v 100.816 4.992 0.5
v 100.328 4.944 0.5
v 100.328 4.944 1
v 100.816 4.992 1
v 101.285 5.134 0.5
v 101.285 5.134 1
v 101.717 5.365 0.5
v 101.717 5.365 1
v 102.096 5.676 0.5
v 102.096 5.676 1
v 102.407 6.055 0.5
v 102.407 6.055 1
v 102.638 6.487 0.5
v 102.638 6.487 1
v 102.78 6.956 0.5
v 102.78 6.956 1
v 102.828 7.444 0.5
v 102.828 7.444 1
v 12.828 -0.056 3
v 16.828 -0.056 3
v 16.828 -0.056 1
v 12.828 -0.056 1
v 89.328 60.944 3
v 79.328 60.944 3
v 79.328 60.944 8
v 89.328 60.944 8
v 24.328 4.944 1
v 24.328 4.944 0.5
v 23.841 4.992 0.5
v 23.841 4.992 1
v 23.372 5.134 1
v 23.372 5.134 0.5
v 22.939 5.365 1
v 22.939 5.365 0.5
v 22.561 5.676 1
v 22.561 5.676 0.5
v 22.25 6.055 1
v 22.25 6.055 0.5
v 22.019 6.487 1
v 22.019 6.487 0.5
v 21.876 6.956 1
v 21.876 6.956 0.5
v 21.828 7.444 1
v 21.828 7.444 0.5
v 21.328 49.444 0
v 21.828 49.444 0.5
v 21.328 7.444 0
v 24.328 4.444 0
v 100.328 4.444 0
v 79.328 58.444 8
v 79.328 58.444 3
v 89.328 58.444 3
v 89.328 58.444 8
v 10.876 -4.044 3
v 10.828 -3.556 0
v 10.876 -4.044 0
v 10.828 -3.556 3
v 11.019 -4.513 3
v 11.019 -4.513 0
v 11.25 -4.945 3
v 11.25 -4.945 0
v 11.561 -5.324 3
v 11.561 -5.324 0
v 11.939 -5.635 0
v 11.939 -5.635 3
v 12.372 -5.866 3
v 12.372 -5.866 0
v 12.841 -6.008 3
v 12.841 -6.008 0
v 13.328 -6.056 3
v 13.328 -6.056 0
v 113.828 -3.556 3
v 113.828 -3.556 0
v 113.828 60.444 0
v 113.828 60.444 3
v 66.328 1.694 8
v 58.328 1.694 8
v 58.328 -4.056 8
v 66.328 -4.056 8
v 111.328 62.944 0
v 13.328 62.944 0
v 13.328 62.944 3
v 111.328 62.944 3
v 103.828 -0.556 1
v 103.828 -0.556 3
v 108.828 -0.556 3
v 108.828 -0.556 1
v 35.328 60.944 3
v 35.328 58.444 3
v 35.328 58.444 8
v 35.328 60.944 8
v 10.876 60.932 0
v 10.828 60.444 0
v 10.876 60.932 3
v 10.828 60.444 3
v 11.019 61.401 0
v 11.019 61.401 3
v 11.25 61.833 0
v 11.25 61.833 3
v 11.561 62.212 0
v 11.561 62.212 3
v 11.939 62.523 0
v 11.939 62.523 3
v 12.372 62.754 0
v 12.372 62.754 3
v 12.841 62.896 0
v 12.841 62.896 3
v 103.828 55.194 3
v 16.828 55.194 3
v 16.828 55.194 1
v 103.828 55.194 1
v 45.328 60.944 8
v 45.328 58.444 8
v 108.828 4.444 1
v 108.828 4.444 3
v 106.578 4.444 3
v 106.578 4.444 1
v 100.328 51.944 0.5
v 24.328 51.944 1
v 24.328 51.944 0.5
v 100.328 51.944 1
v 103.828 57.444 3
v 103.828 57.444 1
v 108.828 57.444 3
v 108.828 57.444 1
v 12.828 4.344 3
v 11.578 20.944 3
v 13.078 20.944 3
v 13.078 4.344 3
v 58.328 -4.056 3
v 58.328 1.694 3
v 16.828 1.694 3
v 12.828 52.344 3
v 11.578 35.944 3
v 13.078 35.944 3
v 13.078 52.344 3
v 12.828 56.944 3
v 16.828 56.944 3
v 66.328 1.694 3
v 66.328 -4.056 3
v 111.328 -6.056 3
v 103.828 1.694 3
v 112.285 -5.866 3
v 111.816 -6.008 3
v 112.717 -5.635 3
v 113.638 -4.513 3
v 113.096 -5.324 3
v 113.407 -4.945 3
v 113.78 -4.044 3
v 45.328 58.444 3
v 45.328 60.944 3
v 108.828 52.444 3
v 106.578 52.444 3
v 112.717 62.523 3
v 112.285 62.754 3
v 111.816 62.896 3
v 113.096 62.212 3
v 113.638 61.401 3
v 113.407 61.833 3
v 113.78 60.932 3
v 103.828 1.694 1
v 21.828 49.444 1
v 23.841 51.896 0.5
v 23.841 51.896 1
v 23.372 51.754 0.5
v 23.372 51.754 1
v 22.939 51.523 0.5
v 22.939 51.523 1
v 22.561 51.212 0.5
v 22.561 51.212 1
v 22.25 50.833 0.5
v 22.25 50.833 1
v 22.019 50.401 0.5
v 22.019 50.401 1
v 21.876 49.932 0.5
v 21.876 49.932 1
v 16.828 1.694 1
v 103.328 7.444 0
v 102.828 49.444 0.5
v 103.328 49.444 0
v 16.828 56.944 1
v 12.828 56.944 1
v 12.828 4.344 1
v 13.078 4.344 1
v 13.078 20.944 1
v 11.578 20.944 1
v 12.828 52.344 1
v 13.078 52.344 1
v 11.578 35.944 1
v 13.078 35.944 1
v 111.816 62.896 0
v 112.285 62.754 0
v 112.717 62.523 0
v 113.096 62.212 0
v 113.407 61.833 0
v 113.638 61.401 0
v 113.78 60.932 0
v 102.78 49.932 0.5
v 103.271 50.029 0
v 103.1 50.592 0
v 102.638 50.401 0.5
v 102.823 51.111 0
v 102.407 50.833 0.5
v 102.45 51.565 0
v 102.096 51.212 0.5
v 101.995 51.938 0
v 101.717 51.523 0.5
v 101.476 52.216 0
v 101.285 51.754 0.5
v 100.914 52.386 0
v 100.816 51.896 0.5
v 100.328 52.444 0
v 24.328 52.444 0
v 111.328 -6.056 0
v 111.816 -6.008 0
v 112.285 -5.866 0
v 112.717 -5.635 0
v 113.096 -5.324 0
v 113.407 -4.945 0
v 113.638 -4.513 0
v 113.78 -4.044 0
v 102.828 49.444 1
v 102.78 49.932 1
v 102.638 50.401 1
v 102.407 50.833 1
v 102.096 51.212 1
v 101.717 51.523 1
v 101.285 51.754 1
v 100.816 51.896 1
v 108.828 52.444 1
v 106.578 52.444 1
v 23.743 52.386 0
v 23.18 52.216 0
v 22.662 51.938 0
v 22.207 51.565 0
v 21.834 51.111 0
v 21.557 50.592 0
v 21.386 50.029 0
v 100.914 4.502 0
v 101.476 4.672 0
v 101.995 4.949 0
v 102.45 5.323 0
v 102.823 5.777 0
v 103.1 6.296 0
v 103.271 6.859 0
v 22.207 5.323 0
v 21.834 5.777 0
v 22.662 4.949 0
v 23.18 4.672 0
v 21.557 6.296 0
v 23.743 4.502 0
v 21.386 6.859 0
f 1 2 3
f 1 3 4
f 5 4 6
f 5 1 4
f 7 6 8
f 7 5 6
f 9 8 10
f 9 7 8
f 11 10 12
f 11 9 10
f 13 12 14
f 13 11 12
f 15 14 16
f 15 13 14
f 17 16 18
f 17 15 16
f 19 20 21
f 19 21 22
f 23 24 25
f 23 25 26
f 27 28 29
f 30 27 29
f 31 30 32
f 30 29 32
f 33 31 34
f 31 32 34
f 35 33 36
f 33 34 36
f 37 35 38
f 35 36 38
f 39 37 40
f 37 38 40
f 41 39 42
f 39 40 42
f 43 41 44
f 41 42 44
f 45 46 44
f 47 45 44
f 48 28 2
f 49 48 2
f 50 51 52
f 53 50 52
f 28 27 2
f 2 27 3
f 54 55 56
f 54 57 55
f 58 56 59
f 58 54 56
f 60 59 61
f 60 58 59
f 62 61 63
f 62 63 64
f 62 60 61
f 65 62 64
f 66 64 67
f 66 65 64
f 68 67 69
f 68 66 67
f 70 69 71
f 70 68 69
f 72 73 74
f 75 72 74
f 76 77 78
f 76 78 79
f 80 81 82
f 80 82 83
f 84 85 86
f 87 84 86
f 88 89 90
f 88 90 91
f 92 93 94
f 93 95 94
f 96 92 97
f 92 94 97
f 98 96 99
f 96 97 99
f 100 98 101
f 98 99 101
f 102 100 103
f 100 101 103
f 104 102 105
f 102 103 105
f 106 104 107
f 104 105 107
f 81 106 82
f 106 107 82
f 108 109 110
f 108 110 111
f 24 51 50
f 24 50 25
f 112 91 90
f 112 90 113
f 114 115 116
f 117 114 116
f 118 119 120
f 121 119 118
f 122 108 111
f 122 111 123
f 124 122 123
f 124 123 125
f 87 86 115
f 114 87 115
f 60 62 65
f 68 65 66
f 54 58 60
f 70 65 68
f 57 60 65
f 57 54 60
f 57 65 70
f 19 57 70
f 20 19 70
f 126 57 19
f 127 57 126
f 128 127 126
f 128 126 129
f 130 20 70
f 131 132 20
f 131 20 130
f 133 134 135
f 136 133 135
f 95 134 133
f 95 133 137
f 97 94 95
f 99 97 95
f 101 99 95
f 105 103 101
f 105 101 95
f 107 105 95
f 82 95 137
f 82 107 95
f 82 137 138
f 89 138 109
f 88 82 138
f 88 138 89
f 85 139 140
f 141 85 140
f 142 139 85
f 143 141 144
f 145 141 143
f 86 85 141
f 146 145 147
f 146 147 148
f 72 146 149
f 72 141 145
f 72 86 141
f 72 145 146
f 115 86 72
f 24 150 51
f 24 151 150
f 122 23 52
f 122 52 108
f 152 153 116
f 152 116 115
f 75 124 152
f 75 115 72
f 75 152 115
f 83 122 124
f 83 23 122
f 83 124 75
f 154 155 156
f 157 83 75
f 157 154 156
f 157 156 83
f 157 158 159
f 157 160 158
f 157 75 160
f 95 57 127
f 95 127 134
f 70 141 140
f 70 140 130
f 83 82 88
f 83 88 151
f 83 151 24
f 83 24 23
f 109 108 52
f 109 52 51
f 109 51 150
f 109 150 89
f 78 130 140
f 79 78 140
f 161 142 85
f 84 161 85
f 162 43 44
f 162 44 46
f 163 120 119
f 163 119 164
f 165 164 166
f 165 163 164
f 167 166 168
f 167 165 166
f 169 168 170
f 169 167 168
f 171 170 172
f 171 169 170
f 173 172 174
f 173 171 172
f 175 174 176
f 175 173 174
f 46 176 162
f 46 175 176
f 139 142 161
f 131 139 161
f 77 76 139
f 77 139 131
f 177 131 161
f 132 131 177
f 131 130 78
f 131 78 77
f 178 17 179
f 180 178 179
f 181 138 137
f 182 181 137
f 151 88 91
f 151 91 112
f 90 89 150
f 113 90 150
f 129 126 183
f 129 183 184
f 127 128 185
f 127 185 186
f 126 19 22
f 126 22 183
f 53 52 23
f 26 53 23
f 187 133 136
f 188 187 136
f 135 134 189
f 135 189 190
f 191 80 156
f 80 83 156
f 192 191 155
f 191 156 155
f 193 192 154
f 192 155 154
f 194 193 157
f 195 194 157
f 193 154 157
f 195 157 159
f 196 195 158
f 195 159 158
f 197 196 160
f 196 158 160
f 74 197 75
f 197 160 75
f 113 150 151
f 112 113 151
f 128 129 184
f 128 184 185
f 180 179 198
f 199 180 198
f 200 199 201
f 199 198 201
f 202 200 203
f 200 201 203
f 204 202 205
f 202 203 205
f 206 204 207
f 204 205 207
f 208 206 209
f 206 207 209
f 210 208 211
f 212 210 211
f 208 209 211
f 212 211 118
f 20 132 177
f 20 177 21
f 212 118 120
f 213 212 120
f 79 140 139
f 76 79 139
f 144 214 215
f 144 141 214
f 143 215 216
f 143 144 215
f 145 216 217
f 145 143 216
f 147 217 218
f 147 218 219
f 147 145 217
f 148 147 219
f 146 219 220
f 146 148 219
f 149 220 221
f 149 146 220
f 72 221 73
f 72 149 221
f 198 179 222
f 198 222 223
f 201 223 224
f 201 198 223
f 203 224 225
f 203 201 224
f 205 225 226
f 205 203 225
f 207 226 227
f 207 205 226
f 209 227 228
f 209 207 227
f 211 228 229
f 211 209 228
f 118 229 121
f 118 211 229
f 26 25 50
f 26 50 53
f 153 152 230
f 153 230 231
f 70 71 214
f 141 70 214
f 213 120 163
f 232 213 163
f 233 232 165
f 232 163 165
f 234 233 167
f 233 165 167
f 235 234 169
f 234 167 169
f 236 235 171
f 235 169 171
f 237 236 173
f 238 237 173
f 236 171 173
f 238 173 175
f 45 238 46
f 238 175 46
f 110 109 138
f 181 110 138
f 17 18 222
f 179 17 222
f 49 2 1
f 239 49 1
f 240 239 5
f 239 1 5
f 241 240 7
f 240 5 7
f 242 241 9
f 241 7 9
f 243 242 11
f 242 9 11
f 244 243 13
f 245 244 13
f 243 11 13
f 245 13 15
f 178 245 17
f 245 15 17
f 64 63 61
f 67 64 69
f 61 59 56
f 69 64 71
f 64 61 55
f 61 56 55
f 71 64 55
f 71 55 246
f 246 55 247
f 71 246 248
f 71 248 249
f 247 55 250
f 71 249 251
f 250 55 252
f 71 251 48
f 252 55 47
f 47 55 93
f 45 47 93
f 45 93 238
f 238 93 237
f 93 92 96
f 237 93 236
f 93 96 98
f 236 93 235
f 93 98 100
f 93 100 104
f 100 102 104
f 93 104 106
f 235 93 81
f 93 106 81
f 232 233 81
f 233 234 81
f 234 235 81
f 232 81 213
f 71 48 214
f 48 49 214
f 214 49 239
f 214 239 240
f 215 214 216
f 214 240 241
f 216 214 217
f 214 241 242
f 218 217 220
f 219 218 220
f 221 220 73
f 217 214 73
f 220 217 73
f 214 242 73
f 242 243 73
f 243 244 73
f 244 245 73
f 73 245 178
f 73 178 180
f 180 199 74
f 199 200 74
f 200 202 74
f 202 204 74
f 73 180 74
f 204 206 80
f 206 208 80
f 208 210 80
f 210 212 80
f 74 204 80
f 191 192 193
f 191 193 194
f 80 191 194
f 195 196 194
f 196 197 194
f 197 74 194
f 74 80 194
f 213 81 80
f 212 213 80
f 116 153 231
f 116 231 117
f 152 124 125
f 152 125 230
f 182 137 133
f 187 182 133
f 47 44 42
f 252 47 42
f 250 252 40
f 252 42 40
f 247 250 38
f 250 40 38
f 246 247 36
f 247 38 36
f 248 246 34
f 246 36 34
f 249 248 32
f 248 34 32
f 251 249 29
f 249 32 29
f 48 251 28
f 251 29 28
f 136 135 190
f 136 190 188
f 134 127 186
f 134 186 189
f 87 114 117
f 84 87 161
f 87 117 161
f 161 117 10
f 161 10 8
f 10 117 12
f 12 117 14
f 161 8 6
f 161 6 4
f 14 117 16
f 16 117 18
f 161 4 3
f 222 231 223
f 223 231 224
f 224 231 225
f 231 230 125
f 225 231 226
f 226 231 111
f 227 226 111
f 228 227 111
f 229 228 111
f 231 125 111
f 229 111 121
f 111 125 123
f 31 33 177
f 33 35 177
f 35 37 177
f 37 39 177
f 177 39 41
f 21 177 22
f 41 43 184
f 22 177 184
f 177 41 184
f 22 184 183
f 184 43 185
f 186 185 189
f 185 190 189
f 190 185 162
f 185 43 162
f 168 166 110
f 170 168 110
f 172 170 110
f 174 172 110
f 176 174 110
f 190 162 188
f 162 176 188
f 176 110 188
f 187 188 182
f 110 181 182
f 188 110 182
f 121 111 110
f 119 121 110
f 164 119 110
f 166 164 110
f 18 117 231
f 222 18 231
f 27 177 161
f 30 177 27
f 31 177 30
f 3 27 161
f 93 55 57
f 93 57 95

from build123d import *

# Parameters (mm, degrees)
SKETCH1_W           = 103
SKETCH1_H           = 69
BOSS_EXTRUDE1_DEPTH = 3
SKETCH2_W           = 81
SKETCH2_H           = 47
CUT_EXTRUDE1_DEPTH  = 3
CUT_EXTRUDE2_DEPTH  = 2
FILLET2_R           = 2.5
FILLET3_R           = 2.5
CHAMFER1_SIZE       = 0.5
CUT_EXTRUDE3_DEPTH  = 2
SKETCH5_W           = 10
SKETCH5_H           = 2.5
BOSS_EXTRUDE2_DEPTH = 5
SKETCH6_W           = 8
SKETCH6_H           = 5.75
BOSS_EXTRUDE3_DEPTH = 5


with BuildPart() as part:
    # Sketch1 → Boss-Extrude1 (new body)
    with BuildSketch(Plane.XY):
        with Locations((62.328366078, 28.443882797)):
            Rectangle(SKETCH1_W, SKETCH1_H)
    extrude(amount=BOSS_EXTRUDE1_DEPTH)

    # Sketch2 → Cut-Extrude1 (cut)
    with BuildSketch(Plane.XY.offset(3)):
        with Locations((62.328366078, 28.443882797)):
            Rectangle(SKETCH2_W, SKETCH2_H)
    extrude(amount=-CUT_EXTRUDE1_DEPTH, mode=Mode.SUBTRACT)

    # Sketch3 → Cut-Extrude2 (cut)
    with BuildSketch(Plane.XY.offset(3)):
        Polygon((13.078366078, 55.193882797), (106.578366078, 55.193882797), (106.578366078, 1.693882797), (13.078366078, 1.693882797), (13.078366078, 20.943882797), (11.578366078, 20.943882797), (11.578366078, 35.943882797), (13.078366078, 35.943882797), align=None)
    extrude(amount=-CUT_EXTRUDE2_DEPTH, mode=Mode.SUBTRACT)

    # Fillet2
    fillet2_edges = [part.edges().sort_by_distance(p)[0] for p in [
        (113.828366078, -6.056117203, 1.5),
        (10.828366078, -6.056117203, 1.5),
        (10.828366078, 62.943882797, 1.5),
        (113.828366078, 62.943882797, 1.5),
    ]]
    fillet(fillet2_edges, radius=FILLET2_R)

    # Fillet3
    fillet3_edges = [part.edges().sort_by_distance(p)[0] for p in [
        (21.828366078, 4.943882797, 0.5),
        (21.828366078, 51.943882797, 0.5),
        (102.828366078, 51.943882797, 0.5),
        (102.828366078, 4.943882797, 0.5),
    ]]
    fillet(fillet3_edges, radius=FILLET3_R)

    # Chamfer1
    chamfer1_edges = [part.edges().sort_by_distance(p)[0] for p in [
        (62.328366078, 4.943882797, 0),
        (102.828366078, 28.443882797, 0),
        (22.560599125, 51.21164975, 0),
        (22.560599125, 5.676115844, 0),
        (102.096133031, 5.676115844, 0),
        (102.096133031, 51.21164975, 0),
        (21.828366078, 28.443882797, 0),
        (62.328366078, 51.943882797, 0),
    ]]
    chamfer(chamfer1_edges, length=CHAMFER1_SIZE)

    # Sketch4 → Cut-Extrude3 (cut)
    with BuildSketch(Plane.XY.offset(3)):
        Polygon((16.828366078, 55.193882797), (16.828366078, 56.943882797), (12.828366078, 56.943882797), (12.828366078, 52.343882797), (13.078366078, 52.343882797), (13.078366078, 55.193882797), align=None)
        Polygon((103.828366078, 55.193882797), (103.828366078, 57.443882797), (108.828366078, 57.443882797), (108.828366078, 52.443882797), (106.578366078, 52.443882797), (106.578366078, 55.193882797), align=None)
        Polygon((16.828366078, 1.693882797), (16.828366078, -0.056117203), (12.828366078, -0.056117203), (12.828366078, 4.343882797), (13.078366078, 4.343882797), (13.078366078, 1.693882797), align=None)
        Polygon((103.828366078, 1.693882797), (103.828366078, -0.556117203), (108.828366078, -0.556117203), (108.828366078, 4.443882797), (106.578366078, 4.443882797), (106.578366078, 1.693882797), align=None)
    extrude(amount=-CUT_EXTRUDE3_DEPTH, mode=Mode.SUBTRACT)

    # Sketch5 → Boss-Extrude2 (add)
    with BuildSketch(Plane.XY.offset(3)):
        with Locations((84.328366078, 59.693882797)):
            Rectangle(SKETCH5_W, SKETCH5_H)
        with Locations((40.328366078, 59.693882797)):
            Rectangle(SKETCH5_W, SKETCH5_H)
    extrude(amount=BOSS_EXTRUDE2_DEPTH)

    # Sketch6 → Boss-Extrude3 (add)
    with BuildSketch(Plane.XY.offset(3)):
        with Locations((62.328366078, -1.181117203)):
            Rectangle(SKETCH6_W, SKETCH6_H)
    extrude(amount=BOSS_EXTRUDE3_DEPTH)


solid = part.part
